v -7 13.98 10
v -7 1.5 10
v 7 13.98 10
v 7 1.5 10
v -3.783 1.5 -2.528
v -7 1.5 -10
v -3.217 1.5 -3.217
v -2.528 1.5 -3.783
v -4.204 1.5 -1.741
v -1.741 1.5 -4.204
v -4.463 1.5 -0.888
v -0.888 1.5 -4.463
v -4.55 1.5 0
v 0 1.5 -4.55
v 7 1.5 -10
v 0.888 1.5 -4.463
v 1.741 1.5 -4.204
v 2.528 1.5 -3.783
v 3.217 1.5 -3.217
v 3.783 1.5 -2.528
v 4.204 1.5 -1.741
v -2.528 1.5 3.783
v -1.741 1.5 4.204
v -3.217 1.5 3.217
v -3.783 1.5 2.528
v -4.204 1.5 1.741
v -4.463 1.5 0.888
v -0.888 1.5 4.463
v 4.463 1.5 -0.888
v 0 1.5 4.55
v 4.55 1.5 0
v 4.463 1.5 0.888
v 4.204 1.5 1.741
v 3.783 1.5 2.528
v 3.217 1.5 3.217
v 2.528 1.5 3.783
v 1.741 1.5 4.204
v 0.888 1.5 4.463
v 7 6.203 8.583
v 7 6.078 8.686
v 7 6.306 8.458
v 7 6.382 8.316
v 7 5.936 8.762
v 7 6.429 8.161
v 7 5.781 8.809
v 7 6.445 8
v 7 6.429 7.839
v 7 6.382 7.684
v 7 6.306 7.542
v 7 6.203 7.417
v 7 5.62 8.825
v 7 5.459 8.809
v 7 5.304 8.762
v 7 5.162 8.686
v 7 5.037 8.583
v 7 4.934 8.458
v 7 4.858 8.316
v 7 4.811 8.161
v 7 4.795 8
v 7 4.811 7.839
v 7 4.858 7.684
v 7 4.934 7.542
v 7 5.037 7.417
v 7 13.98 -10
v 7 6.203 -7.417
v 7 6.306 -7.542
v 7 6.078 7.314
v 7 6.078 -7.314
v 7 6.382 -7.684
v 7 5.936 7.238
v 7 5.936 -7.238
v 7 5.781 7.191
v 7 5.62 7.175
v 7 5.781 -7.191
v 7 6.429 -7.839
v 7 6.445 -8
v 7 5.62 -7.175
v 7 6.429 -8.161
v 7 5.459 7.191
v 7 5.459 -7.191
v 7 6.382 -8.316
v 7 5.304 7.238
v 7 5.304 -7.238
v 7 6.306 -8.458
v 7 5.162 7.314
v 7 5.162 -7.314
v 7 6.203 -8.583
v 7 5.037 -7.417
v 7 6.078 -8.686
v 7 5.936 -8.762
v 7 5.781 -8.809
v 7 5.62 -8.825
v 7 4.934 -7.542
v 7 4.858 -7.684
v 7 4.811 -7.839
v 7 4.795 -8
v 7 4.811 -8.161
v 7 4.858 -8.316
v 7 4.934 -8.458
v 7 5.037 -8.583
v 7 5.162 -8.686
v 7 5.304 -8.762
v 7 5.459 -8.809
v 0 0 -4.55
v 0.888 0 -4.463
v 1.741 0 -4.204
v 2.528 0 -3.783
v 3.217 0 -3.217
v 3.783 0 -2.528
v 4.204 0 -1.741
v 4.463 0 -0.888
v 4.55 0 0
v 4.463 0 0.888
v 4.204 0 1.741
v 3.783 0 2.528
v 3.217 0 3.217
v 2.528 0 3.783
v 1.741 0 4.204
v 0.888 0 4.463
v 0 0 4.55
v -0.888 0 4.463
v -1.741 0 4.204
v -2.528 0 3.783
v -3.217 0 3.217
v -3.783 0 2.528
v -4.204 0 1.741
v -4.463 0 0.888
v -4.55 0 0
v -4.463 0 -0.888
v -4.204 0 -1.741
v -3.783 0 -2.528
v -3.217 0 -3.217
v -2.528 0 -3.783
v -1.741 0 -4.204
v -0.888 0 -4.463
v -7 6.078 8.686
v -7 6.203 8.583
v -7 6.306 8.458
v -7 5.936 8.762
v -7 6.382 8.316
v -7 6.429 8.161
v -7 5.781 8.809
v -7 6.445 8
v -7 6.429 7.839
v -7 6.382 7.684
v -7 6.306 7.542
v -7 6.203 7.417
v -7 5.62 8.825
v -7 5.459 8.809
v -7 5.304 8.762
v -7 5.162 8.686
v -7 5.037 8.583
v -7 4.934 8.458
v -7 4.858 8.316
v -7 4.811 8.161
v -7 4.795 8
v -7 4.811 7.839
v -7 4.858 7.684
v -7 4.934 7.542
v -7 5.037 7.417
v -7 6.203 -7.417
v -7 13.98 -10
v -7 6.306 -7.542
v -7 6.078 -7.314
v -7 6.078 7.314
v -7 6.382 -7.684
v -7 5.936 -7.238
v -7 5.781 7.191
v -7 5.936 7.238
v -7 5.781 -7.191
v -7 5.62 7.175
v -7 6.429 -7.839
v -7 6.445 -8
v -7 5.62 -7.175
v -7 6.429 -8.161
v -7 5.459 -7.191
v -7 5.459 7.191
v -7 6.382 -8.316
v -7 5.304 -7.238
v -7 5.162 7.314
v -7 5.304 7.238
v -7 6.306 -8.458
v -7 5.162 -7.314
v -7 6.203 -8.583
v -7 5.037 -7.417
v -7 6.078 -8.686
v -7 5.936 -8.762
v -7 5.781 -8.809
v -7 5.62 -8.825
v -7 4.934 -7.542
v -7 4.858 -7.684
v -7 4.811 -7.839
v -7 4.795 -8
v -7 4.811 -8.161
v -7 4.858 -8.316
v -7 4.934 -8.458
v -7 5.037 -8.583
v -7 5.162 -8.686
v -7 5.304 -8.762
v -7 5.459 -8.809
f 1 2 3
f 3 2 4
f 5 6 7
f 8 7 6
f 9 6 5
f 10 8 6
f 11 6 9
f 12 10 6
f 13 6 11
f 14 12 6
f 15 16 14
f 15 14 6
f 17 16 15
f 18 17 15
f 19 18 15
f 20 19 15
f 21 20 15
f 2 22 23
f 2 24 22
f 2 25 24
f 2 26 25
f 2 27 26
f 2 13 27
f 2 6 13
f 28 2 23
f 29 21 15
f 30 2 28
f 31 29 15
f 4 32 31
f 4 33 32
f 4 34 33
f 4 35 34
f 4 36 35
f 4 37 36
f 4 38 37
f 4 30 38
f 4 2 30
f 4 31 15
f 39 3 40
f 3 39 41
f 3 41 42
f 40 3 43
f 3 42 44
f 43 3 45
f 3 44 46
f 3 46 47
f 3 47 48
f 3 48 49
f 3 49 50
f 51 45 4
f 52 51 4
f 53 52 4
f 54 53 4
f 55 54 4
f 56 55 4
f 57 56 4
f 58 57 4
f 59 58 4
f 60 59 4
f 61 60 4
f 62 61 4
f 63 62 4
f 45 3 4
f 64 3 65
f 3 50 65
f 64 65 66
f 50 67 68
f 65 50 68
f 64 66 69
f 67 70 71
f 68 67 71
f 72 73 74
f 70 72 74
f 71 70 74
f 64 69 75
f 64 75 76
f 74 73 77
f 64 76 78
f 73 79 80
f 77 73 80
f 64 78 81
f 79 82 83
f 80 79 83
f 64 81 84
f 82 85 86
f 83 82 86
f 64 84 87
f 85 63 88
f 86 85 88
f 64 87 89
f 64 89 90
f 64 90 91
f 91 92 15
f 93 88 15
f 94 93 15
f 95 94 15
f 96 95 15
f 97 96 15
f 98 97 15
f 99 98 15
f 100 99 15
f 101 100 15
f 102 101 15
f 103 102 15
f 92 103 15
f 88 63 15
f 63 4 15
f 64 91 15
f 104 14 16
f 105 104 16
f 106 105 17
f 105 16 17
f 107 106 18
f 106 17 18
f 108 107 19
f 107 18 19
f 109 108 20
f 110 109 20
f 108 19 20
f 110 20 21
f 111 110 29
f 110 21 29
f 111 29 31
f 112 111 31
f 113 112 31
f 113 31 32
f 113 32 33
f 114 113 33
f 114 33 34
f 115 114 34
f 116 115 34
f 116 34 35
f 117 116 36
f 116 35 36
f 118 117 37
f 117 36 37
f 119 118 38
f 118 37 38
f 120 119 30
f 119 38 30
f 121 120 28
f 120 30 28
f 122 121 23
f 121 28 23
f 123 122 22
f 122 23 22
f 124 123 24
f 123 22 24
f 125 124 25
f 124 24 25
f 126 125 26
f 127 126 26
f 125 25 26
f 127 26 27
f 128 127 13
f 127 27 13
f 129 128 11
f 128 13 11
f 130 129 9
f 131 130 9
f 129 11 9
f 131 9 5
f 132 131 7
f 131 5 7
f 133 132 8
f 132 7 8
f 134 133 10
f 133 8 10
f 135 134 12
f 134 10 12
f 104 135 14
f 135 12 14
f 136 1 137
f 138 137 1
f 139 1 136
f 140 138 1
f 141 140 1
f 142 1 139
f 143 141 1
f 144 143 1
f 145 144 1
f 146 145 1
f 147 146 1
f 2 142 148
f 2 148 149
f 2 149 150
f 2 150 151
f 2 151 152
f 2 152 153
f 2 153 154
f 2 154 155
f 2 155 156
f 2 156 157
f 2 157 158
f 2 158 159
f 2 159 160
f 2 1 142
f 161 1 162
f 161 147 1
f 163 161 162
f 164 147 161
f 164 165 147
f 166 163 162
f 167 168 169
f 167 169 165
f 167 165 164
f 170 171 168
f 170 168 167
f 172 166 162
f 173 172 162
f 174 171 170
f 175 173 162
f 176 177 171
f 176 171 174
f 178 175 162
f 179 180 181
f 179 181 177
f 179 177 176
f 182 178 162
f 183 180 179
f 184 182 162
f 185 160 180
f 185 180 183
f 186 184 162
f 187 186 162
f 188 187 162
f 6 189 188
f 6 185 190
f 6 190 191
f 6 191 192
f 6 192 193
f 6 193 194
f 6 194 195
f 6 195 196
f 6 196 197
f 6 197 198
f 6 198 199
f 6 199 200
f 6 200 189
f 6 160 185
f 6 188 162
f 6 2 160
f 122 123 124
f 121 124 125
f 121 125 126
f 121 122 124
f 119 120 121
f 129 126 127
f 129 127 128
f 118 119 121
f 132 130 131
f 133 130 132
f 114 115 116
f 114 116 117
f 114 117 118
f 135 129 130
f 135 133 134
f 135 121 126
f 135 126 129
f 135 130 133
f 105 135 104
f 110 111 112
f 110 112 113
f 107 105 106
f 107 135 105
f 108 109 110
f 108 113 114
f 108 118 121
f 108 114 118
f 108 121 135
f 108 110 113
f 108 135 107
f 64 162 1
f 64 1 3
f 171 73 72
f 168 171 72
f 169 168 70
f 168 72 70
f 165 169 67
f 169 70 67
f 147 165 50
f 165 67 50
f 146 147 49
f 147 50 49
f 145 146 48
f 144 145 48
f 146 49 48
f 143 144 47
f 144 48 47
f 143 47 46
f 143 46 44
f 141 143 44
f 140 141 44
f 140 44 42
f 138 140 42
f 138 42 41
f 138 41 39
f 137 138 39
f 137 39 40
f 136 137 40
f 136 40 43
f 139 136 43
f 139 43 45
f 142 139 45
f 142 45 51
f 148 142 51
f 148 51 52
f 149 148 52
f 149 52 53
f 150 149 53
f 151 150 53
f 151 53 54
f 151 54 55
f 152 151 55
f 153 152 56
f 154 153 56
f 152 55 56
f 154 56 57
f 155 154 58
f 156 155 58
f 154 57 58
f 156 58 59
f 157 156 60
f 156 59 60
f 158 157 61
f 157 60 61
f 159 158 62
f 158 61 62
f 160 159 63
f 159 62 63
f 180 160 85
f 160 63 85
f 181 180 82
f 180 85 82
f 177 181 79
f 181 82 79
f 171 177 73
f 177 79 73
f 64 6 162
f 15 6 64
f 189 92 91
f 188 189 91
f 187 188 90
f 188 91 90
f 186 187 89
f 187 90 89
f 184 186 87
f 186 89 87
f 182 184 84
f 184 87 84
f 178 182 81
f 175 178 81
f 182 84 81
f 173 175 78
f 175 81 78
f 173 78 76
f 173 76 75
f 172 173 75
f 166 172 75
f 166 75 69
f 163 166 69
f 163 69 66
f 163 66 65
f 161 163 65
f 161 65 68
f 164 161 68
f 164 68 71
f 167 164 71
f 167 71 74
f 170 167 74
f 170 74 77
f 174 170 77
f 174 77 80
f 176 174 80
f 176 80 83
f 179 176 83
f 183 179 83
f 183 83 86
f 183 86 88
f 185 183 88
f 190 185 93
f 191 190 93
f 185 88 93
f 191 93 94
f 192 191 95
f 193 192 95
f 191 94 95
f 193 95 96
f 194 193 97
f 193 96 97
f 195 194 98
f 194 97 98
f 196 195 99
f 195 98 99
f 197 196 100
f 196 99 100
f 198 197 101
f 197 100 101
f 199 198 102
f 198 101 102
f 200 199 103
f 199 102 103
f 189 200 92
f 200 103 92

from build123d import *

# Parameters (mm, degrees)
SKETCH1_W           = 14
SKETCH1_H           = 20
BOSS_EXTRUDE1_DEPTH = 13.98
SKETCH2_R           = 0.825
CUT_EXTRUDE1_DEPTH  = 23.168455066
SKETCH6_W           = 14
SKETCH6_H           = 20
CUT_EXTRUDE2_DEPTH  = 1.5
SKETCH7_R           = 4.55
BOSS_EXTRUDE2_DEPTH = 1.5


with BuildPart() as part:
    # Sketch1 → Boss-Extrude1 (new body)
    with BuildSketch(Plane(origin=(0, 0, 0), x_dir=(1, 0, 0), z_dir=(0, 1, 0))):
        Rectangle(SKETCH1_W, SKETCH1_H)
    extrude(amount=BOSS_EXTRUDE1_DEPTH)

    # Sketch2 → Cut-Extrude1 (cut, through all)
    with BuildSketch(Plane(origin=(7, 0, 0), x_dir=(0, 0, -1), z_dir=(1, 0, 0))):
        with Locations((8, 5.62)):
            Circle(SKETCH2_R)
        with Locations((-8, 5.62)):
            Circle(SKETCH2_R)
    extrude(amount=-CUT_EXTRUDE1_DEPTH, mode=Mode.SUBTRACT)

    # Sketch6 → Cut-Extrude2 (cut)
    with BuildSketch(Plane.XZ):
        Rectangle(SKETCH6_W, SKETCH6_H)
    extrude(amount=-CUT_EXTRUDE2_DEPTH, mode=Mode.SUBTRACT)

    # Sketch7 → Boss-Extrude2 (add)
    with BuildSketch(Plane.XZ.offset(-1.5)):
        with Locations(Location((0, 0, 0), (0, 0, 270))):
            Circle(SKETCH7_R)
    extrude(amount=BOSS_EXTRUDE2_DEPTH)


solid = part.part
